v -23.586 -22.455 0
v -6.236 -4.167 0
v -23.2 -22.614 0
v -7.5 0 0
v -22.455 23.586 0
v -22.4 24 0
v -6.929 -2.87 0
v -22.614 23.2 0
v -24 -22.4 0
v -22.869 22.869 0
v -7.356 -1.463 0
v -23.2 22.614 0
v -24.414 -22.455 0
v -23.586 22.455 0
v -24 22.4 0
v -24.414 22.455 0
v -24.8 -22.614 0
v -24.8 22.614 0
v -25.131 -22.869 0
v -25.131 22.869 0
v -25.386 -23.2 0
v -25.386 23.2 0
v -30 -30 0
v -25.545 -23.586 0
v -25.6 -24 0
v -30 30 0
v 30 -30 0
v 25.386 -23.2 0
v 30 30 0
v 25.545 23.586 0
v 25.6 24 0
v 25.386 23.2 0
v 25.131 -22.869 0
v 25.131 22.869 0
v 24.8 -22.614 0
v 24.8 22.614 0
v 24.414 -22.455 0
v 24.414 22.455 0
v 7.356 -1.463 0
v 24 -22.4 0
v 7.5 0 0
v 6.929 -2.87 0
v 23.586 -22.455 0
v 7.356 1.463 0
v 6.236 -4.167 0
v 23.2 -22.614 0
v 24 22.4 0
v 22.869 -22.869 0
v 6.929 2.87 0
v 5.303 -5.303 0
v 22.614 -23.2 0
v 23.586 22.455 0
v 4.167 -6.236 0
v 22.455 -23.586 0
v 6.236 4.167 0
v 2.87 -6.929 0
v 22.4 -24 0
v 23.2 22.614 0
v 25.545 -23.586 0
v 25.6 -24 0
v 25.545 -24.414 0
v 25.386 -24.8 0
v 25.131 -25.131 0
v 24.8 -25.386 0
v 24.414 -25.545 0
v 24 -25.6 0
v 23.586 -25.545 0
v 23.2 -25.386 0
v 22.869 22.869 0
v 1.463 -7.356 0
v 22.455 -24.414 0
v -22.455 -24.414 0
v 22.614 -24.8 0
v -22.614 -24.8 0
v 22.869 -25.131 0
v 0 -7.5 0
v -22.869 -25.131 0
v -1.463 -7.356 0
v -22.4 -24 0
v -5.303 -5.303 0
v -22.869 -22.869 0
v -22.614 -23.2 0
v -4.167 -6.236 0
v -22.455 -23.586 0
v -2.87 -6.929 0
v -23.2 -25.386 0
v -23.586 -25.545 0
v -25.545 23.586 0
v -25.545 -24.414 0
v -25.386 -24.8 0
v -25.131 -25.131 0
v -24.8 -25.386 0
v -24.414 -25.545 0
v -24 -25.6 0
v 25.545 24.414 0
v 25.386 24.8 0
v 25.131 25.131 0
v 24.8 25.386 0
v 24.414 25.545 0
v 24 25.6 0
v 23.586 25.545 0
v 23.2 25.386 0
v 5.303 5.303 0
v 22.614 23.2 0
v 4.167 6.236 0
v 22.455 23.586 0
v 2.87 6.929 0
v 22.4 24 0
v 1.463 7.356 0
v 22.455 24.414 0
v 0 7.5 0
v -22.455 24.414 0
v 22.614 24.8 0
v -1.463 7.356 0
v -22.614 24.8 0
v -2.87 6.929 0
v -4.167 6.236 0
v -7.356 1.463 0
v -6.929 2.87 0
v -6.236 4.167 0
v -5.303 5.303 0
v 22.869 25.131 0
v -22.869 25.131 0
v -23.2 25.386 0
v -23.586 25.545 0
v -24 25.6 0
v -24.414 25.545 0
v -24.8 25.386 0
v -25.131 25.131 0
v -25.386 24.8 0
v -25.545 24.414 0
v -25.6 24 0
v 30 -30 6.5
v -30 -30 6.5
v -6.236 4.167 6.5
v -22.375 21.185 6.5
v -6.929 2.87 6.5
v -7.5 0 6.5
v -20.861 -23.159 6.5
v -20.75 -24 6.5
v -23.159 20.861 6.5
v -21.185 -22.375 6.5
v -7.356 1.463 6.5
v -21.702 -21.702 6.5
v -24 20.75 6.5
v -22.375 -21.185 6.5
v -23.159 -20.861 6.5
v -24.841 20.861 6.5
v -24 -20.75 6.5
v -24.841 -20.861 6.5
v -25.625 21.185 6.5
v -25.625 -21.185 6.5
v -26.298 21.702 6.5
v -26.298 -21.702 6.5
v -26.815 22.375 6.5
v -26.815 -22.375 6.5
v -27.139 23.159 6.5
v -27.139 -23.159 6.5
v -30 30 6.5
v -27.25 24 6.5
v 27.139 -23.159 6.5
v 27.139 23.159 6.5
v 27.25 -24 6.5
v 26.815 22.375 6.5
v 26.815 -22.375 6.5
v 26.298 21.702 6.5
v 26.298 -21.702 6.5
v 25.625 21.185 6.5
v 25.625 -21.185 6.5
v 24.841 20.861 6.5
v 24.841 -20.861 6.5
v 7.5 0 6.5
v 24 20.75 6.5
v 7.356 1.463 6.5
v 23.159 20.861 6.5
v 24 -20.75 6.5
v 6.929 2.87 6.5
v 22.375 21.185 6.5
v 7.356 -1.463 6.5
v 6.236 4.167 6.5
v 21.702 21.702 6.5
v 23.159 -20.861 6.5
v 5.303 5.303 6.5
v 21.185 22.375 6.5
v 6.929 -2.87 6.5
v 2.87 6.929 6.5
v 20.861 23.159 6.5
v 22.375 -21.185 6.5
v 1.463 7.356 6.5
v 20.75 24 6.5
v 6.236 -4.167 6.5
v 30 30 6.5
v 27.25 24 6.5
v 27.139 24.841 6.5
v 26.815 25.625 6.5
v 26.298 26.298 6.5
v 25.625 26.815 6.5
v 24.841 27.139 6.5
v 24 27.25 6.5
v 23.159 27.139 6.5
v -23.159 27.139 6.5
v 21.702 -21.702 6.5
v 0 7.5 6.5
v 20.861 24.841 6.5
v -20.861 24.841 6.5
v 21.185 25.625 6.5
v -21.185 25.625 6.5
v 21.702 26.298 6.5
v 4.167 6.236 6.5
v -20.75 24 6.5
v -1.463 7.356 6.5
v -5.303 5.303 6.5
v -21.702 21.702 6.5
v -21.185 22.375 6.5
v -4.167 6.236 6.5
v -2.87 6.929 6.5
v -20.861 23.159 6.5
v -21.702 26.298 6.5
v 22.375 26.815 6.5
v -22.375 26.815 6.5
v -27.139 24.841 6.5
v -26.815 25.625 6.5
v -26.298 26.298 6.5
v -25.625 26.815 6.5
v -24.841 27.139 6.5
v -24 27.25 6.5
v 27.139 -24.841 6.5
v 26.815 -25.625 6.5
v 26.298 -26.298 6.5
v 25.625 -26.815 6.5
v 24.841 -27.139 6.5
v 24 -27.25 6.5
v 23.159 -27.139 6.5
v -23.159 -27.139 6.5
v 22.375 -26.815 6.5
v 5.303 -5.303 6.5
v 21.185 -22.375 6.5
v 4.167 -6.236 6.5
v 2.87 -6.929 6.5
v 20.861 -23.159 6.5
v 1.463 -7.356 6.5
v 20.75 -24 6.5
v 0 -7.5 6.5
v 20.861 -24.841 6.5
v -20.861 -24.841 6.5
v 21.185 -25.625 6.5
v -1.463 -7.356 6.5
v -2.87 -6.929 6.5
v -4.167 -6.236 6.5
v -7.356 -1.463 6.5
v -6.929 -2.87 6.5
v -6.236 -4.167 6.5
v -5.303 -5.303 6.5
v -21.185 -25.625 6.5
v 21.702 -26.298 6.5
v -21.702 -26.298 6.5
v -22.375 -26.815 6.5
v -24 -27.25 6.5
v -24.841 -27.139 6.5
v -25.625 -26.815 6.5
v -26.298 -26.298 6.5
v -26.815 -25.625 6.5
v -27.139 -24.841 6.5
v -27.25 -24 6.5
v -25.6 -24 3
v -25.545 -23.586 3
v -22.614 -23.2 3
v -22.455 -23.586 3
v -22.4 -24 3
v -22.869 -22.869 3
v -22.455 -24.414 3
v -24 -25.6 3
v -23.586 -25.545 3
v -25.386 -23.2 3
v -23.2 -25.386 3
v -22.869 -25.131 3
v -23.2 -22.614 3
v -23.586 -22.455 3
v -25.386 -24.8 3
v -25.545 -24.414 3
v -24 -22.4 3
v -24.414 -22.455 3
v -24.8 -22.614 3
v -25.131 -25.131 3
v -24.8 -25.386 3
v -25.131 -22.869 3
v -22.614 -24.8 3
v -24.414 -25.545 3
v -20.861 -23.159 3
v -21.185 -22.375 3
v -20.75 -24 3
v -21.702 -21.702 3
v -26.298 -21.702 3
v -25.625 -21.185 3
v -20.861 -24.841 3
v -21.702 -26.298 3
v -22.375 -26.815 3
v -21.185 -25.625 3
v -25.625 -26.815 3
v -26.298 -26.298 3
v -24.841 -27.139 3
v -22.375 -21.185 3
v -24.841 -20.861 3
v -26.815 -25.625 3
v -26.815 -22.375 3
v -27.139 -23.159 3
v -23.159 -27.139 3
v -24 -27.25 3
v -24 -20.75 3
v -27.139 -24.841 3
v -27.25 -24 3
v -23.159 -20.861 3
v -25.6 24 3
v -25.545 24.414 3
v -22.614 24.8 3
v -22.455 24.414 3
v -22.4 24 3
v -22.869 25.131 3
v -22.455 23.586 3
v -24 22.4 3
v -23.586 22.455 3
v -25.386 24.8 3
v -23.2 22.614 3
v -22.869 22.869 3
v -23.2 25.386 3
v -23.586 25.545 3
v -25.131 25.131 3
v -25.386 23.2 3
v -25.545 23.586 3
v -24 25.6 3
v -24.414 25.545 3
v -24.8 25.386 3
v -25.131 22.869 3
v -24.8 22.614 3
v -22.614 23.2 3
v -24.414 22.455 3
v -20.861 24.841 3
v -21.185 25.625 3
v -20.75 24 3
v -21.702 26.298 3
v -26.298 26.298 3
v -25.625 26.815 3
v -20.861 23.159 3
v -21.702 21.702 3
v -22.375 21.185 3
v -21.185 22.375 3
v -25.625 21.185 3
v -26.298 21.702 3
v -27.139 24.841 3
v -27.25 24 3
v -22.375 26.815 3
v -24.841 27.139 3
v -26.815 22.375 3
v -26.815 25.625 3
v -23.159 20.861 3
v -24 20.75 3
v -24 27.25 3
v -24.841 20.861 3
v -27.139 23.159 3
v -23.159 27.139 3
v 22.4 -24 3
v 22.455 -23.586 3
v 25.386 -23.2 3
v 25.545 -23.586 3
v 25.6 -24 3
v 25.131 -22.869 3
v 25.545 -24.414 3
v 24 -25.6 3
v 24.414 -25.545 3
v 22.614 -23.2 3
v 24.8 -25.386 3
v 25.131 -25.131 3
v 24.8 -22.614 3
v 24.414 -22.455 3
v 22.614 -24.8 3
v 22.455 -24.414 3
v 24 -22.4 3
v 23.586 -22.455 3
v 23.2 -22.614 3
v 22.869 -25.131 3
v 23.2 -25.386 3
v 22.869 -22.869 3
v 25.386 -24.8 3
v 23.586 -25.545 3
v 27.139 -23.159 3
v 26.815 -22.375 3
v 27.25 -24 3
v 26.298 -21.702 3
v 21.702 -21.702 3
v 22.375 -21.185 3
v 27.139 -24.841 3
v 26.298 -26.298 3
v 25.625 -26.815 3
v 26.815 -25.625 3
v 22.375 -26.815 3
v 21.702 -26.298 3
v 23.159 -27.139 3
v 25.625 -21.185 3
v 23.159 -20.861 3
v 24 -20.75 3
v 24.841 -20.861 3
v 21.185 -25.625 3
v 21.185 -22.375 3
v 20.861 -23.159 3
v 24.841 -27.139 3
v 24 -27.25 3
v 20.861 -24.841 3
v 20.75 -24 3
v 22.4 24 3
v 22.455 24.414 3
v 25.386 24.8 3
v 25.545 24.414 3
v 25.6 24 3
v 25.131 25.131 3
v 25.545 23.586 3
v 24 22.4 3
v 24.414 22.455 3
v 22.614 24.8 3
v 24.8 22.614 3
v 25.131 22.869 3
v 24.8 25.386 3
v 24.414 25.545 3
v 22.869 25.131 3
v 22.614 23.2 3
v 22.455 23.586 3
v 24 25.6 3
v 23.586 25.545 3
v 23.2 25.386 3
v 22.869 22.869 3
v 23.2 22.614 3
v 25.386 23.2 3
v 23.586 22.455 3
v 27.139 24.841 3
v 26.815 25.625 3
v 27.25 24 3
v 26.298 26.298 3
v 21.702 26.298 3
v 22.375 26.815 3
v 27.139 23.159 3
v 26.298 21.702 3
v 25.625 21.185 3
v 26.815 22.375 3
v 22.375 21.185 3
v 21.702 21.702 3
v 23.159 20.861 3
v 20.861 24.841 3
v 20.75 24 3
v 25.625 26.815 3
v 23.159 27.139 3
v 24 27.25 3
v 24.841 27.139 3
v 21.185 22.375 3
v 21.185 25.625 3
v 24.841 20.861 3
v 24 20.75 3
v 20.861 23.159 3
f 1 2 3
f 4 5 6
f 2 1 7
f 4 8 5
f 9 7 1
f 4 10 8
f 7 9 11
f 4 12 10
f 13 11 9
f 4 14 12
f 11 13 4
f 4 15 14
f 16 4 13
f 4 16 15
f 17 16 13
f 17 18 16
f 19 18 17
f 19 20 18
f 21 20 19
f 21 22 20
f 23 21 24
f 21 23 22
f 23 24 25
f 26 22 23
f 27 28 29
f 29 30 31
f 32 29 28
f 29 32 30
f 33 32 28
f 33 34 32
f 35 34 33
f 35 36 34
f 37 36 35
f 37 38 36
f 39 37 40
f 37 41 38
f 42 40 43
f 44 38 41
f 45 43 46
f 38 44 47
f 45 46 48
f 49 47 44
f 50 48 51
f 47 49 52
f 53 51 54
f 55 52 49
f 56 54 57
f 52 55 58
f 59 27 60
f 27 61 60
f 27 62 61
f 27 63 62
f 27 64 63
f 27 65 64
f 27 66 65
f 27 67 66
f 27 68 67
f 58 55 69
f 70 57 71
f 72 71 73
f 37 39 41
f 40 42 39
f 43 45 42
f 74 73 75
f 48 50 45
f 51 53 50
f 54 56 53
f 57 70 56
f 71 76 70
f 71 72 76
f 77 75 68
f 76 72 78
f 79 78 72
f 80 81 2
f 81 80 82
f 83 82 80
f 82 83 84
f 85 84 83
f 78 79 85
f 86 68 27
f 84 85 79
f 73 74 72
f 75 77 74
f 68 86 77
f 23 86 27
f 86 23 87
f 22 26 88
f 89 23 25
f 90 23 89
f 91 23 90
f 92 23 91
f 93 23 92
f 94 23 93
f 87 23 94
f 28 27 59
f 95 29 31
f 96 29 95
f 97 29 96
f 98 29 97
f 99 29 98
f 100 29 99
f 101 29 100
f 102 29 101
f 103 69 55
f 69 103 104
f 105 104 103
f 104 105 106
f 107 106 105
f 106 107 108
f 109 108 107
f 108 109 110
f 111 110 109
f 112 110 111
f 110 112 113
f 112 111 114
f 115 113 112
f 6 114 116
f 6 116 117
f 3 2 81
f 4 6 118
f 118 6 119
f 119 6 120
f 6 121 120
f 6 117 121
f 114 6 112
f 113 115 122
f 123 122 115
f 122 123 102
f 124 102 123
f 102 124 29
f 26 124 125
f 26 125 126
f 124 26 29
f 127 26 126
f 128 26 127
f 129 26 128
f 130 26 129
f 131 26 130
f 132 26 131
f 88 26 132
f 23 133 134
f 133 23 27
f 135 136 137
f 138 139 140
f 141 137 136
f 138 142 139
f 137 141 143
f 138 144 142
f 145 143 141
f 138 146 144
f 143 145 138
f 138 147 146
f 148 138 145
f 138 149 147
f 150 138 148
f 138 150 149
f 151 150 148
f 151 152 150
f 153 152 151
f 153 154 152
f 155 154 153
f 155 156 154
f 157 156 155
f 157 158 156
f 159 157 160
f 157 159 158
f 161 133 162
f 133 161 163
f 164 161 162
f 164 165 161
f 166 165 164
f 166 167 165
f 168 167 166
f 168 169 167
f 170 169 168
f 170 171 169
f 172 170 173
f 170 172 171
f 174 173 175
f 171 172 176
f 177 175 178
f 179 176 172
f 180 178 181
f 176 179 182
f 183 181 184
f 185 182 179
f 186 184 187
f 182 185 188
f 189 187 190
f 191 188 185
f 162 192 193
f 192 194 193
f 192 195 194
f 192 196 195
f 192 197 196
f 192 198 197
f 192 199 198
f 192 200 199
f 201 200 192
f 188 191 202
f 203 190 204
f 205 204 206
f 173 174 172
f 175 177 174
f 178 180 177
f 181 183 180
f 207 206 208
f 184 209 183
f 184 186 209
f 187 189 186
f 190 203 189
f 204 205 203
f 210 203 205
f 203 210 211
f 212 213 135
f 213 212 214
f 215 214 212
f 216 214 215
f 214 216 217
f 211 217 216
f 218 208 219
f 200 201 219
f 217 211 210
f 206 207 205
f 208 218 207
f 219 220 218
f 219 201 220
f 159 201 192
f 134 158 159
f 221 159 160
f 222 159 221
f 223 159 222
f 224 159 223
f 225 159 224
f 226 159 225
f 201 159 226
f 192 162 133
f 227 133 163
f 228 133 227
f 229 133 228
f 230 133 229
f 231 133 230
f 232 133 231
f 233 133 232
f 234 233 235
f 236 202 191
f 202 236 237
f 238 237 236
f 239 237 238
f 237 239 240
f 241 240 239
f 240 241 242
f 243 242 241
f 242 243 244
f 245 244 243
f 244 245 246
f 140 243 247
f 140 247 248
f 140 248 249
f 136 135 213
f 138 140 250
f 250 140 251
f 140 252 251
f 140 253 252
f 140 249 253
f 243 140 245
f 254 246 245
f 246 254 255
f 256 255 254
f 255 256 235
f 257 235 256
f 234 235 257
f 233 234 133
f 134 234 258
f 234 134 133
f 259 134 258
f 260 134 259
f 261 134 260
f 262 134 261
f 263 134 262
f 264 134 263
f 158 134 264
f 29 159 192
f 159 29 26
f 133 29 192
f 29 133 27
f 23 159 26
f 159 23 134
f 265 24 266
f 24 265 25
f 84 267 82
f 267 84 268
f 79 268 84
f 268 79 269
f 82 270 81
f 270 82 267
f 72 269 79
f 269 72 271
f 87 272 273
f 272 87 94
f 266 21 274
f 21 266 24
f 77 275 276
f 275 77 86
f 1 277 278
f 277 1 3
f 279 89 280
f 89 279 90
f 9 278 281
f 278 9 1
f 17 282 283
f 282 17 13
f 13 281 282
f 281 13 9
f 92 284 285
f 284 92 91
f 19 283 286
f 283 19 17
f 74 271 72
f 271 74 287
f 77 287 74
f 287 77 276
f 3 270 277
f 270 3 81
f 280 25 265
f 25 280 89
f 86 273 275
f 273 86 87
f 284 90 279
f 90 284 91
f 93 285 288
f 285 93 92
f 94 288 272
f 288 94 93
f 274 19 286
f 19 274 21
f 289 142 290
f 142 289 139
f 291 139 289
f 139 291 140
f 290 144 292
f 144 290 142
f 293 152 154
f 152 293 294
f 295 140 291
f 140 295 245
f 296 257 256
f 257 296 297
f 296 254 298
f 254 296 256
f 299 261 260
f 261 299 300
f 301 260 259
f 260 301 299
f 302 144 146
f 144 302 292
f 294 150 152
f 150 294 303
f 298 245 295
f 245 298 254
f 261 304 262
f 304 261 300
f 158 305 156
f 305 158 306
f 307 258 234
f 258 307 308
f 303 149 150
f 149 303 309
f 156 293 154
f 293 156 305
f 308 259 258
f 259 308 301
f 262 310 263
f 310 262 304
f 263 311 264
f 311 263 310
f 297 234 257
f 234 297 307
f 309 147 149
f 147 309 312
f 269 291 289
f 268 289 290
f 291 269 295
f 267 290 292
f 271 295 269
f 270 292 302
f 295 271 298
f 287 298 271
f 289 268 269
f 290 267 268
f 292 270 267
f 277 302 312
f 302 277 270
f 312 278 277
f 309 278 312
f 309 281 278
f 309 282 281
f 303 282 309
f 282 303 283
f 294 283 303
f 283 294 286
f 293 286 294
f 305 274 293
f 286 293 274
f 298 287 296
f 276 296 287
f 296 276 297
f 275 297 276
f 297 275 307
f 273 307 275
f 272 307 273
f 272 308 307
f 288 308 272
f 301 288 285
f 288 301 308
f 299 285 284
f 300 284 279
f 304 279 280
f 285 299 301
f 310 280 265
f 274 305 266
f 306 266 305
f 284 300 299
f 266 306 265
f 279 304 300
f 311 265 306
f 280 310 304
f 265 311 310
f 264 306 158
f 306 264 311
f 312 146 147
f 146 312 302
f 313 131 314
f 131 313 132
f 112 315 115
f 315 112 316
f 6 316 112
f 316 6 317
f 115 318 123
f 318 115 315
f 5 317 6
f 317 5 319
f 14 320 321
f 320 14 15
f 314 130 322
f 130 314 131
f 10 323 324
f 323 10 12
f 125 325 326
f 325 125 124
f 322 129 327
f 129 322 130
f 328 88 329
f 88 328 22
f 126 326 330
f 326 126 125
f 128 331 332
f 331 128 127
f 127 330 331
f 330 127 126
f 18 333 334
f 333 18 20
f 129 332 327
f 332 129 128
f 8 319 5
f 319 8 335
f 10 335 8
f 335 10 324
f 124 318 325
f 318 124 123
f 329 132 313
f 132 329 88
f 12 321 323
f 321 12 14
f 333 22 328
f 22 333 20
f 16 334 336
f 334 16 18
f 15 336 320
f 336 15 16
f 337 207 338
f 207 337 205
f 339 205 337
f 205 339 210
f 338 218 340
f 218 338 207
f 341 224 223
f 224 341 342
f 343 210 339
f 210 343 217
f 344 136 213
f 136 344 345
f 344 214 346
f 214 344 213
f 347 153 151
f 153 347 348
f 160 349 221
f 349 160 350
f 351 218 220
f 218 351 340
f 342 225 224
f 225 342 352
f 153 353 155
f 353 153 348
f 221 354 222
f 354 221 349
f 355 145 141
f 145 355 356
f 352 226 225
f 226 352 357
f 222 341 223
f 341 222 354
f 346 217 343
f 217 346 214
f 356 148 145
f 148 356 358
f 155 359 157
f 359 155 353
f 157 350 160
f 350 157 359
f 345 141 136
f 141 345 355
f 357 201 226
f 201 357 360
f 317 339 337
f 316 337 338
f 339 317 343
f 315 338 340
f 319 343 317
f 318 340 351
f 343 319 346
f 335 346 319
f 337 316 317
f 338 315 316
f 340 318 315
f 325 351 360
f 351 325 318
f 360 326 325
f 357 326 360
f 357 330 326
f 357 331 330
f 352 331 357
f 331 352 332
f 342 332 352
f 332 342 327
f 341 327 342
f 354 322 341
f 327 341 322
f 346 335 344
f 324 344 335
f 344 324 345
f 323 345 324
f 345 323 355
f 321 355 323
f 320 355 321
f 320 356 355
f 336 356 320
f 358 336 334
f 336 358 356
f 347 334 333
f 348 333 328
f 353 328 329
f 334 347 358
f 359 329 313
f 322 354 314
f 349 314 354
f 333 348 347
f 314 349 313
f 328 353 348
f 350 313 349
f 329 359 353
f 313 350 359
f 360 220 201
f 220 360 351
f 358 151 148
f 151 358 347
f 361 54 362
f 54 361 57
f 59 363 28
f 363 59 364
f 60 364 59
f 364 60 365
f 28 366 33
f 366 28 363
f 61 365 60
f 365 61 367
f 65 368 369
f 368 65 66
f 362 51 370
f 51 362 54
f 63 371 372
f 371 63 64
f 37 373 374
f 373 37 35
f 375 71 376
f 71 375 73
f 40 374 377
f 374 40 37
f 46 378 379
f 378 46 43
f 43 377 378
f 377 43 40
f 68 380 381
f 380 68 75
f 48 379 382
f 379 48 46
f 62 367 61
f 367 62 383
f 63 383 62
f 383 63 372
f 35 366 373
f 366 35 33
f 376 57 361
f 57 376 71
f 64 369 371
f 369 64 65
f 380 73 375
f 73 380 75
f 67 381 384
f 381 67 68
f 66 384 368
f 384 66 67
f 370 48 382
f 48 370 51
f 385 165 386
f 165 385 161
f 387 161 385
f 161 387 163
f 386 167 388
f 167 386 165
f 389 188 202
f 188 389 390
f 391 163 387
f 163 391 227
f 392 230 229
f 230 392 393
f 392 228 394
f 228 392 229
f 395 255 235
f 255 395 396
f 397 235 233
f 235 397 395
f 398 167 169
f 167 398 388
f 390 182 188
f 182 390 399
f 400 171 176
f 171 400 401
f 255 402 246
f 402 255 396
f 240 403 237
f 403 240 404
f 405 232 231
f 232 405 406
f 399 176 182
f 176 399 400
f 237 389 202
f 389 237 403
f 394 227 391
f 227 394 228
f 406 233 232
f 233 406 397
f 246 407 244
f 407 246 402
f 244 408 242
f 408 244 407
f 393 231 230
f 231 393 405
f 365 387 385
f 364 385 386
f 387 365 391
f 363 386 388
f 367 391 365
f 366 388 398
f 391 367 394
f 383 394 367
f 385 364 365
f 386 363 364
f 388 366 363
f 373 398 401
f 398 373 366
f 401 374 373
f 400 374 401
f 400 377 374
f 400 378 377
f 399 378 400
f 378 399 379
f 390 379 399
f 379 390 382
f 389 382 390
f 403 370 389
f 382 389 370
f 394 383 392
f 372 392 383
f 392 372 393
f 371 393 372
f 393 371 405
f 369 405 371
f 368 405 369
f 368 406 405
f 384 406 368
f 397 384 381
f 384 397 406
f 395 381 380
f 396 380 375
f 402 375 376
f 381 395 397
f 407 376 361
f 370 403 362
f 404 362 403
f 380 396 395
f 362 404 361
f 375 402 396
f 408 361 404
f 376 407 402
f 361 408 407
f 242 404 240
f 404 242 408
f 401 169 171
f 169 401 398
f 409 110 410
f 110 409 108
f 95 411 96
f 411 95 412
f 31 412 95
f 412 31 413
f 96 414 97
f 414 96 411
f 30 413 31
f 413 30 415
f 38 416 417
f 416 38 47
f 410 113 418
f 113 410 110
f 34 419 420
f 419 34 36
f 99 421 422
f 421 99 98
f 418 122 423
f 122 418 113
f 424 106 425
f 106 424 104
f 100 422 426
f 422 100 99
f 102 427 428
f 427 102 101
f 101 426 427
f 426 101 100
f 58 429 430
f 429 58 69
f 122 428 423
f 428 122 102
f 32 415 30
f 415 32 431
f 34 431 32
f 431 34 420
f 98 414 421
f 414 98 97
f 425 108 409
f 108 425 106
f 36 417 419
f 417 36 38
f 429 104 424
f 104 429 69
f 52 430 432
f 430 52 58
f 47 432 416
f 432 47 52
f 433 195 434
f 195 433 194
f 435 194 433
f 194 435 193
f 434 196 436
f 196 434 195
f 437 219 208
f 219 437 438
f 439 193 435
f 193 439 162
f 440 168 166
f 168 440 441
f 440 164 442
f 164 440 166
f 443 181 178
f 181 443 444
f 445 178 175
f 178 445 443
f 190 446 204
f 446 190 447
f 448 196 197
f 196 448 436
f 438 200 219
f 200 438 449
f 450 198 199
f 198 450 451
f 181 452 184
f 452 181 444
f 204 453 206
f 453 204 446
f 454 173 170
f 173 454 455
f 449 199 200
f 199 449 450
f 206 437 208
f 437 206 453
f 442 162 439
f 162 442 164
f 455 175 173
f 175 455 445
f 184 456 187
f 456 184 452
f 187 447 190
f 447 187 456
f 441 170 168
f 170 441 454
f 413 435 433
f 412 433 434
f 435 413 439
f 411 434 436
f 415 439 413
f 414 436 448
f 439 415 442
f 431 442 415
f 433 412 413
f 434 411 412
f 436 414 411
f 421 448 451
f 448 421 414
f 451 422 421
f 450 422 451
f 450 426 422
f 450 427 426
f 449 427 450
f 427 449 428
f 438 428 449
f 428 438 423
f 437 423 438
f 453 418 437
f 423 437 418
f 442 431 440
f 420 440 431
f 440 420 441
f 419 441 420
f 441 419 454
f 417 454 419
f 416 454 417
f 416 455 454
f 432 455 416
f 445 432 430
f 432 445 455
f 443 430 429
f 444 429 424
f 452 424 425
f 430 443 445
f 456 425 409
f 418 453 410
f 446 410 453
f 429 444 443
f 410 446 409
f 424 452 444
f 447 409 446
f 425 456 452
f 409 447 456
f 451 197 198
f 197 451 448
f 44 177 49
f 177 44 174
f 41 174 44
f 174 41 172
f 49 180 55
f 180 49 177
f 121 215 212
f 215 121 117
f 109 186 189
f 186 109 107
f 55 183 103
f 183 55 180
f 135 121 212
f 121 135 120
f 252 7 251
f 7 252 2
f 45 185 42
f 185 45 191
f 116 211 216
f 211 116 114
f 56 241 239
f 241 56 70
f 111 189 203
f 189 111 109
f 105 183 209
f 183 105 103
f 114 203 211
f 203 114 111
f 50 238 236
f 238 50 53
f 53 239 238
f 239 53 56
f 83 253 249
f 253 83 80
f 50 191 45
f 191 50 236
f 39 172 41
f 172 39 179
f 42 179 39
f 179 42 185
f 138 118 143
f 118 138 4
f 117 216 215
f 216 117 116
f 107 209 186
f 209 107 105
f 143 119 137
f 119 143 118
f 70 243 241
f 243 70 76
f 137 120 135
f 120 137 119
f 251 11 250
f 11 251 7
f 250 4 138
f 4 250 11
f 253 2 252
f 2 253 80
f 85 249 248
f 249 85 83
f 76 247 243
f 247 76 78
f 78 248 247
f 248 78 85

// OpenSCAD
// ==========================================
// Xentient Framework - Anchor: Wall Plate Adapter
// Plugs into Rear Universal Anchor (40mm circular recess)
// Per Framework §5
// ==========================================
// Component: Male cylinder (40mm dia) with cross-keys
//            Flares to 60×60mm flat plate with 4× M3 countersunk holes
// Material: PETG (structural)
// Units: mm

$fn = 64;

// ==========================================
// ANCHOR DIMENSIONS (matching hub rear)
// ==========================================

Anchor_Dia   = 40.0;    // Male cylinder diameter
Anchor_Depth = 6.0;     // Insertion depth into hub
Anchor_Key_W = 10.0;    // Anti-rotation cross-key width
Anchor_Key_H = Anchor_Depth;  // Key height matches depth

// Wall plate dimensions
Plate_W      = 60.0;    // Square plate width
Plate_T      = 6.0;     // Plate thickness
M3_CSK_Dia  = 6.5;     // M3 countersunk head diameter
M3_Hole_Dia = 3.2;     // M3 screw hole diameter
CSK_Depth   = 3.0;     // Countersink depth
Hole_Offset = 24.0;    // Hole offset from center (24mm = 48mm span)

// Wire routing
Wire_Hole_D = 15.0;    // Central wire routing hole diameter

// ==========================================
// MODULE: anchor_wall_plate()
// ==========================================

module anchor_wall_plate() {
    difference() {
        union() {
            // Male cylinder (plugs into hub rear)
            cylinder(h=Anchor_Depth, d=Anchor_Dia, $fn=64);

            // Anti-rotation cross-keys (2 perpendicular ridges)
            for (a = [0, 90]) {
                rotate([0, 0, a])
                    translate([0, -Anchor_Key_W/2, 0])
                        cube([Anchor_Dia/2 + 2, Anchor_Key_W, Anchor_Key_H]);
            }

            // Transition from cylinder to square plate
            hull() {
                cylinder(h=1, d=Anchor_Dia + 4, $fn=64);
                translate([0, 0, Plate_T])
                    cube([Plate_W, Plate_W, 1], center=true);
            }

            // Wall plate
            translate([0, 0, Plate_T / 2])
                cube([Plate_W, Plate_W, Plate_T], center=true);
        }

        // Anti-rotation keyways in hub (matching grooves)
        // These are cut from the cylinder — the hub has matching channels

        // Central wire routing hole (for USB power through drywall)
        translate([0, 0, -1])
            cylinder(h=Anchor_Depth + Plate_T + 2, d=Wire_Hole_D, $fn=32);

        // 4× M3 countersunk holes
        for (sx = [-1, 1], sy = [-1, 1]) {
            translate([sx * Hole_Offset, sy * Hole_Offset, 0]) {
                // Through hole
                translate([0, 0, -1])
                    cylinder(h=Anchor_Depth + Plate_T + 2, d=M3_Hole_Dia, $fn=24);
                // Countersink (on outer face)
                translate([0, 0, Plate_T - CSK_Depth])
                    cylinder(h=CSK_Depth + 1, d=M3_CSK_Dia, $fn=24);
            }
        }

        // Draft angle removed — hub pocket is straight 40mm, taper would
        // prevent insertion. The 0.4mm clearance on cross-keys provides
        // enough tolerance for PETG printing.
    }
}

// ==========================================
// RENDER
// ==========================================

anchor_wall_plate();
